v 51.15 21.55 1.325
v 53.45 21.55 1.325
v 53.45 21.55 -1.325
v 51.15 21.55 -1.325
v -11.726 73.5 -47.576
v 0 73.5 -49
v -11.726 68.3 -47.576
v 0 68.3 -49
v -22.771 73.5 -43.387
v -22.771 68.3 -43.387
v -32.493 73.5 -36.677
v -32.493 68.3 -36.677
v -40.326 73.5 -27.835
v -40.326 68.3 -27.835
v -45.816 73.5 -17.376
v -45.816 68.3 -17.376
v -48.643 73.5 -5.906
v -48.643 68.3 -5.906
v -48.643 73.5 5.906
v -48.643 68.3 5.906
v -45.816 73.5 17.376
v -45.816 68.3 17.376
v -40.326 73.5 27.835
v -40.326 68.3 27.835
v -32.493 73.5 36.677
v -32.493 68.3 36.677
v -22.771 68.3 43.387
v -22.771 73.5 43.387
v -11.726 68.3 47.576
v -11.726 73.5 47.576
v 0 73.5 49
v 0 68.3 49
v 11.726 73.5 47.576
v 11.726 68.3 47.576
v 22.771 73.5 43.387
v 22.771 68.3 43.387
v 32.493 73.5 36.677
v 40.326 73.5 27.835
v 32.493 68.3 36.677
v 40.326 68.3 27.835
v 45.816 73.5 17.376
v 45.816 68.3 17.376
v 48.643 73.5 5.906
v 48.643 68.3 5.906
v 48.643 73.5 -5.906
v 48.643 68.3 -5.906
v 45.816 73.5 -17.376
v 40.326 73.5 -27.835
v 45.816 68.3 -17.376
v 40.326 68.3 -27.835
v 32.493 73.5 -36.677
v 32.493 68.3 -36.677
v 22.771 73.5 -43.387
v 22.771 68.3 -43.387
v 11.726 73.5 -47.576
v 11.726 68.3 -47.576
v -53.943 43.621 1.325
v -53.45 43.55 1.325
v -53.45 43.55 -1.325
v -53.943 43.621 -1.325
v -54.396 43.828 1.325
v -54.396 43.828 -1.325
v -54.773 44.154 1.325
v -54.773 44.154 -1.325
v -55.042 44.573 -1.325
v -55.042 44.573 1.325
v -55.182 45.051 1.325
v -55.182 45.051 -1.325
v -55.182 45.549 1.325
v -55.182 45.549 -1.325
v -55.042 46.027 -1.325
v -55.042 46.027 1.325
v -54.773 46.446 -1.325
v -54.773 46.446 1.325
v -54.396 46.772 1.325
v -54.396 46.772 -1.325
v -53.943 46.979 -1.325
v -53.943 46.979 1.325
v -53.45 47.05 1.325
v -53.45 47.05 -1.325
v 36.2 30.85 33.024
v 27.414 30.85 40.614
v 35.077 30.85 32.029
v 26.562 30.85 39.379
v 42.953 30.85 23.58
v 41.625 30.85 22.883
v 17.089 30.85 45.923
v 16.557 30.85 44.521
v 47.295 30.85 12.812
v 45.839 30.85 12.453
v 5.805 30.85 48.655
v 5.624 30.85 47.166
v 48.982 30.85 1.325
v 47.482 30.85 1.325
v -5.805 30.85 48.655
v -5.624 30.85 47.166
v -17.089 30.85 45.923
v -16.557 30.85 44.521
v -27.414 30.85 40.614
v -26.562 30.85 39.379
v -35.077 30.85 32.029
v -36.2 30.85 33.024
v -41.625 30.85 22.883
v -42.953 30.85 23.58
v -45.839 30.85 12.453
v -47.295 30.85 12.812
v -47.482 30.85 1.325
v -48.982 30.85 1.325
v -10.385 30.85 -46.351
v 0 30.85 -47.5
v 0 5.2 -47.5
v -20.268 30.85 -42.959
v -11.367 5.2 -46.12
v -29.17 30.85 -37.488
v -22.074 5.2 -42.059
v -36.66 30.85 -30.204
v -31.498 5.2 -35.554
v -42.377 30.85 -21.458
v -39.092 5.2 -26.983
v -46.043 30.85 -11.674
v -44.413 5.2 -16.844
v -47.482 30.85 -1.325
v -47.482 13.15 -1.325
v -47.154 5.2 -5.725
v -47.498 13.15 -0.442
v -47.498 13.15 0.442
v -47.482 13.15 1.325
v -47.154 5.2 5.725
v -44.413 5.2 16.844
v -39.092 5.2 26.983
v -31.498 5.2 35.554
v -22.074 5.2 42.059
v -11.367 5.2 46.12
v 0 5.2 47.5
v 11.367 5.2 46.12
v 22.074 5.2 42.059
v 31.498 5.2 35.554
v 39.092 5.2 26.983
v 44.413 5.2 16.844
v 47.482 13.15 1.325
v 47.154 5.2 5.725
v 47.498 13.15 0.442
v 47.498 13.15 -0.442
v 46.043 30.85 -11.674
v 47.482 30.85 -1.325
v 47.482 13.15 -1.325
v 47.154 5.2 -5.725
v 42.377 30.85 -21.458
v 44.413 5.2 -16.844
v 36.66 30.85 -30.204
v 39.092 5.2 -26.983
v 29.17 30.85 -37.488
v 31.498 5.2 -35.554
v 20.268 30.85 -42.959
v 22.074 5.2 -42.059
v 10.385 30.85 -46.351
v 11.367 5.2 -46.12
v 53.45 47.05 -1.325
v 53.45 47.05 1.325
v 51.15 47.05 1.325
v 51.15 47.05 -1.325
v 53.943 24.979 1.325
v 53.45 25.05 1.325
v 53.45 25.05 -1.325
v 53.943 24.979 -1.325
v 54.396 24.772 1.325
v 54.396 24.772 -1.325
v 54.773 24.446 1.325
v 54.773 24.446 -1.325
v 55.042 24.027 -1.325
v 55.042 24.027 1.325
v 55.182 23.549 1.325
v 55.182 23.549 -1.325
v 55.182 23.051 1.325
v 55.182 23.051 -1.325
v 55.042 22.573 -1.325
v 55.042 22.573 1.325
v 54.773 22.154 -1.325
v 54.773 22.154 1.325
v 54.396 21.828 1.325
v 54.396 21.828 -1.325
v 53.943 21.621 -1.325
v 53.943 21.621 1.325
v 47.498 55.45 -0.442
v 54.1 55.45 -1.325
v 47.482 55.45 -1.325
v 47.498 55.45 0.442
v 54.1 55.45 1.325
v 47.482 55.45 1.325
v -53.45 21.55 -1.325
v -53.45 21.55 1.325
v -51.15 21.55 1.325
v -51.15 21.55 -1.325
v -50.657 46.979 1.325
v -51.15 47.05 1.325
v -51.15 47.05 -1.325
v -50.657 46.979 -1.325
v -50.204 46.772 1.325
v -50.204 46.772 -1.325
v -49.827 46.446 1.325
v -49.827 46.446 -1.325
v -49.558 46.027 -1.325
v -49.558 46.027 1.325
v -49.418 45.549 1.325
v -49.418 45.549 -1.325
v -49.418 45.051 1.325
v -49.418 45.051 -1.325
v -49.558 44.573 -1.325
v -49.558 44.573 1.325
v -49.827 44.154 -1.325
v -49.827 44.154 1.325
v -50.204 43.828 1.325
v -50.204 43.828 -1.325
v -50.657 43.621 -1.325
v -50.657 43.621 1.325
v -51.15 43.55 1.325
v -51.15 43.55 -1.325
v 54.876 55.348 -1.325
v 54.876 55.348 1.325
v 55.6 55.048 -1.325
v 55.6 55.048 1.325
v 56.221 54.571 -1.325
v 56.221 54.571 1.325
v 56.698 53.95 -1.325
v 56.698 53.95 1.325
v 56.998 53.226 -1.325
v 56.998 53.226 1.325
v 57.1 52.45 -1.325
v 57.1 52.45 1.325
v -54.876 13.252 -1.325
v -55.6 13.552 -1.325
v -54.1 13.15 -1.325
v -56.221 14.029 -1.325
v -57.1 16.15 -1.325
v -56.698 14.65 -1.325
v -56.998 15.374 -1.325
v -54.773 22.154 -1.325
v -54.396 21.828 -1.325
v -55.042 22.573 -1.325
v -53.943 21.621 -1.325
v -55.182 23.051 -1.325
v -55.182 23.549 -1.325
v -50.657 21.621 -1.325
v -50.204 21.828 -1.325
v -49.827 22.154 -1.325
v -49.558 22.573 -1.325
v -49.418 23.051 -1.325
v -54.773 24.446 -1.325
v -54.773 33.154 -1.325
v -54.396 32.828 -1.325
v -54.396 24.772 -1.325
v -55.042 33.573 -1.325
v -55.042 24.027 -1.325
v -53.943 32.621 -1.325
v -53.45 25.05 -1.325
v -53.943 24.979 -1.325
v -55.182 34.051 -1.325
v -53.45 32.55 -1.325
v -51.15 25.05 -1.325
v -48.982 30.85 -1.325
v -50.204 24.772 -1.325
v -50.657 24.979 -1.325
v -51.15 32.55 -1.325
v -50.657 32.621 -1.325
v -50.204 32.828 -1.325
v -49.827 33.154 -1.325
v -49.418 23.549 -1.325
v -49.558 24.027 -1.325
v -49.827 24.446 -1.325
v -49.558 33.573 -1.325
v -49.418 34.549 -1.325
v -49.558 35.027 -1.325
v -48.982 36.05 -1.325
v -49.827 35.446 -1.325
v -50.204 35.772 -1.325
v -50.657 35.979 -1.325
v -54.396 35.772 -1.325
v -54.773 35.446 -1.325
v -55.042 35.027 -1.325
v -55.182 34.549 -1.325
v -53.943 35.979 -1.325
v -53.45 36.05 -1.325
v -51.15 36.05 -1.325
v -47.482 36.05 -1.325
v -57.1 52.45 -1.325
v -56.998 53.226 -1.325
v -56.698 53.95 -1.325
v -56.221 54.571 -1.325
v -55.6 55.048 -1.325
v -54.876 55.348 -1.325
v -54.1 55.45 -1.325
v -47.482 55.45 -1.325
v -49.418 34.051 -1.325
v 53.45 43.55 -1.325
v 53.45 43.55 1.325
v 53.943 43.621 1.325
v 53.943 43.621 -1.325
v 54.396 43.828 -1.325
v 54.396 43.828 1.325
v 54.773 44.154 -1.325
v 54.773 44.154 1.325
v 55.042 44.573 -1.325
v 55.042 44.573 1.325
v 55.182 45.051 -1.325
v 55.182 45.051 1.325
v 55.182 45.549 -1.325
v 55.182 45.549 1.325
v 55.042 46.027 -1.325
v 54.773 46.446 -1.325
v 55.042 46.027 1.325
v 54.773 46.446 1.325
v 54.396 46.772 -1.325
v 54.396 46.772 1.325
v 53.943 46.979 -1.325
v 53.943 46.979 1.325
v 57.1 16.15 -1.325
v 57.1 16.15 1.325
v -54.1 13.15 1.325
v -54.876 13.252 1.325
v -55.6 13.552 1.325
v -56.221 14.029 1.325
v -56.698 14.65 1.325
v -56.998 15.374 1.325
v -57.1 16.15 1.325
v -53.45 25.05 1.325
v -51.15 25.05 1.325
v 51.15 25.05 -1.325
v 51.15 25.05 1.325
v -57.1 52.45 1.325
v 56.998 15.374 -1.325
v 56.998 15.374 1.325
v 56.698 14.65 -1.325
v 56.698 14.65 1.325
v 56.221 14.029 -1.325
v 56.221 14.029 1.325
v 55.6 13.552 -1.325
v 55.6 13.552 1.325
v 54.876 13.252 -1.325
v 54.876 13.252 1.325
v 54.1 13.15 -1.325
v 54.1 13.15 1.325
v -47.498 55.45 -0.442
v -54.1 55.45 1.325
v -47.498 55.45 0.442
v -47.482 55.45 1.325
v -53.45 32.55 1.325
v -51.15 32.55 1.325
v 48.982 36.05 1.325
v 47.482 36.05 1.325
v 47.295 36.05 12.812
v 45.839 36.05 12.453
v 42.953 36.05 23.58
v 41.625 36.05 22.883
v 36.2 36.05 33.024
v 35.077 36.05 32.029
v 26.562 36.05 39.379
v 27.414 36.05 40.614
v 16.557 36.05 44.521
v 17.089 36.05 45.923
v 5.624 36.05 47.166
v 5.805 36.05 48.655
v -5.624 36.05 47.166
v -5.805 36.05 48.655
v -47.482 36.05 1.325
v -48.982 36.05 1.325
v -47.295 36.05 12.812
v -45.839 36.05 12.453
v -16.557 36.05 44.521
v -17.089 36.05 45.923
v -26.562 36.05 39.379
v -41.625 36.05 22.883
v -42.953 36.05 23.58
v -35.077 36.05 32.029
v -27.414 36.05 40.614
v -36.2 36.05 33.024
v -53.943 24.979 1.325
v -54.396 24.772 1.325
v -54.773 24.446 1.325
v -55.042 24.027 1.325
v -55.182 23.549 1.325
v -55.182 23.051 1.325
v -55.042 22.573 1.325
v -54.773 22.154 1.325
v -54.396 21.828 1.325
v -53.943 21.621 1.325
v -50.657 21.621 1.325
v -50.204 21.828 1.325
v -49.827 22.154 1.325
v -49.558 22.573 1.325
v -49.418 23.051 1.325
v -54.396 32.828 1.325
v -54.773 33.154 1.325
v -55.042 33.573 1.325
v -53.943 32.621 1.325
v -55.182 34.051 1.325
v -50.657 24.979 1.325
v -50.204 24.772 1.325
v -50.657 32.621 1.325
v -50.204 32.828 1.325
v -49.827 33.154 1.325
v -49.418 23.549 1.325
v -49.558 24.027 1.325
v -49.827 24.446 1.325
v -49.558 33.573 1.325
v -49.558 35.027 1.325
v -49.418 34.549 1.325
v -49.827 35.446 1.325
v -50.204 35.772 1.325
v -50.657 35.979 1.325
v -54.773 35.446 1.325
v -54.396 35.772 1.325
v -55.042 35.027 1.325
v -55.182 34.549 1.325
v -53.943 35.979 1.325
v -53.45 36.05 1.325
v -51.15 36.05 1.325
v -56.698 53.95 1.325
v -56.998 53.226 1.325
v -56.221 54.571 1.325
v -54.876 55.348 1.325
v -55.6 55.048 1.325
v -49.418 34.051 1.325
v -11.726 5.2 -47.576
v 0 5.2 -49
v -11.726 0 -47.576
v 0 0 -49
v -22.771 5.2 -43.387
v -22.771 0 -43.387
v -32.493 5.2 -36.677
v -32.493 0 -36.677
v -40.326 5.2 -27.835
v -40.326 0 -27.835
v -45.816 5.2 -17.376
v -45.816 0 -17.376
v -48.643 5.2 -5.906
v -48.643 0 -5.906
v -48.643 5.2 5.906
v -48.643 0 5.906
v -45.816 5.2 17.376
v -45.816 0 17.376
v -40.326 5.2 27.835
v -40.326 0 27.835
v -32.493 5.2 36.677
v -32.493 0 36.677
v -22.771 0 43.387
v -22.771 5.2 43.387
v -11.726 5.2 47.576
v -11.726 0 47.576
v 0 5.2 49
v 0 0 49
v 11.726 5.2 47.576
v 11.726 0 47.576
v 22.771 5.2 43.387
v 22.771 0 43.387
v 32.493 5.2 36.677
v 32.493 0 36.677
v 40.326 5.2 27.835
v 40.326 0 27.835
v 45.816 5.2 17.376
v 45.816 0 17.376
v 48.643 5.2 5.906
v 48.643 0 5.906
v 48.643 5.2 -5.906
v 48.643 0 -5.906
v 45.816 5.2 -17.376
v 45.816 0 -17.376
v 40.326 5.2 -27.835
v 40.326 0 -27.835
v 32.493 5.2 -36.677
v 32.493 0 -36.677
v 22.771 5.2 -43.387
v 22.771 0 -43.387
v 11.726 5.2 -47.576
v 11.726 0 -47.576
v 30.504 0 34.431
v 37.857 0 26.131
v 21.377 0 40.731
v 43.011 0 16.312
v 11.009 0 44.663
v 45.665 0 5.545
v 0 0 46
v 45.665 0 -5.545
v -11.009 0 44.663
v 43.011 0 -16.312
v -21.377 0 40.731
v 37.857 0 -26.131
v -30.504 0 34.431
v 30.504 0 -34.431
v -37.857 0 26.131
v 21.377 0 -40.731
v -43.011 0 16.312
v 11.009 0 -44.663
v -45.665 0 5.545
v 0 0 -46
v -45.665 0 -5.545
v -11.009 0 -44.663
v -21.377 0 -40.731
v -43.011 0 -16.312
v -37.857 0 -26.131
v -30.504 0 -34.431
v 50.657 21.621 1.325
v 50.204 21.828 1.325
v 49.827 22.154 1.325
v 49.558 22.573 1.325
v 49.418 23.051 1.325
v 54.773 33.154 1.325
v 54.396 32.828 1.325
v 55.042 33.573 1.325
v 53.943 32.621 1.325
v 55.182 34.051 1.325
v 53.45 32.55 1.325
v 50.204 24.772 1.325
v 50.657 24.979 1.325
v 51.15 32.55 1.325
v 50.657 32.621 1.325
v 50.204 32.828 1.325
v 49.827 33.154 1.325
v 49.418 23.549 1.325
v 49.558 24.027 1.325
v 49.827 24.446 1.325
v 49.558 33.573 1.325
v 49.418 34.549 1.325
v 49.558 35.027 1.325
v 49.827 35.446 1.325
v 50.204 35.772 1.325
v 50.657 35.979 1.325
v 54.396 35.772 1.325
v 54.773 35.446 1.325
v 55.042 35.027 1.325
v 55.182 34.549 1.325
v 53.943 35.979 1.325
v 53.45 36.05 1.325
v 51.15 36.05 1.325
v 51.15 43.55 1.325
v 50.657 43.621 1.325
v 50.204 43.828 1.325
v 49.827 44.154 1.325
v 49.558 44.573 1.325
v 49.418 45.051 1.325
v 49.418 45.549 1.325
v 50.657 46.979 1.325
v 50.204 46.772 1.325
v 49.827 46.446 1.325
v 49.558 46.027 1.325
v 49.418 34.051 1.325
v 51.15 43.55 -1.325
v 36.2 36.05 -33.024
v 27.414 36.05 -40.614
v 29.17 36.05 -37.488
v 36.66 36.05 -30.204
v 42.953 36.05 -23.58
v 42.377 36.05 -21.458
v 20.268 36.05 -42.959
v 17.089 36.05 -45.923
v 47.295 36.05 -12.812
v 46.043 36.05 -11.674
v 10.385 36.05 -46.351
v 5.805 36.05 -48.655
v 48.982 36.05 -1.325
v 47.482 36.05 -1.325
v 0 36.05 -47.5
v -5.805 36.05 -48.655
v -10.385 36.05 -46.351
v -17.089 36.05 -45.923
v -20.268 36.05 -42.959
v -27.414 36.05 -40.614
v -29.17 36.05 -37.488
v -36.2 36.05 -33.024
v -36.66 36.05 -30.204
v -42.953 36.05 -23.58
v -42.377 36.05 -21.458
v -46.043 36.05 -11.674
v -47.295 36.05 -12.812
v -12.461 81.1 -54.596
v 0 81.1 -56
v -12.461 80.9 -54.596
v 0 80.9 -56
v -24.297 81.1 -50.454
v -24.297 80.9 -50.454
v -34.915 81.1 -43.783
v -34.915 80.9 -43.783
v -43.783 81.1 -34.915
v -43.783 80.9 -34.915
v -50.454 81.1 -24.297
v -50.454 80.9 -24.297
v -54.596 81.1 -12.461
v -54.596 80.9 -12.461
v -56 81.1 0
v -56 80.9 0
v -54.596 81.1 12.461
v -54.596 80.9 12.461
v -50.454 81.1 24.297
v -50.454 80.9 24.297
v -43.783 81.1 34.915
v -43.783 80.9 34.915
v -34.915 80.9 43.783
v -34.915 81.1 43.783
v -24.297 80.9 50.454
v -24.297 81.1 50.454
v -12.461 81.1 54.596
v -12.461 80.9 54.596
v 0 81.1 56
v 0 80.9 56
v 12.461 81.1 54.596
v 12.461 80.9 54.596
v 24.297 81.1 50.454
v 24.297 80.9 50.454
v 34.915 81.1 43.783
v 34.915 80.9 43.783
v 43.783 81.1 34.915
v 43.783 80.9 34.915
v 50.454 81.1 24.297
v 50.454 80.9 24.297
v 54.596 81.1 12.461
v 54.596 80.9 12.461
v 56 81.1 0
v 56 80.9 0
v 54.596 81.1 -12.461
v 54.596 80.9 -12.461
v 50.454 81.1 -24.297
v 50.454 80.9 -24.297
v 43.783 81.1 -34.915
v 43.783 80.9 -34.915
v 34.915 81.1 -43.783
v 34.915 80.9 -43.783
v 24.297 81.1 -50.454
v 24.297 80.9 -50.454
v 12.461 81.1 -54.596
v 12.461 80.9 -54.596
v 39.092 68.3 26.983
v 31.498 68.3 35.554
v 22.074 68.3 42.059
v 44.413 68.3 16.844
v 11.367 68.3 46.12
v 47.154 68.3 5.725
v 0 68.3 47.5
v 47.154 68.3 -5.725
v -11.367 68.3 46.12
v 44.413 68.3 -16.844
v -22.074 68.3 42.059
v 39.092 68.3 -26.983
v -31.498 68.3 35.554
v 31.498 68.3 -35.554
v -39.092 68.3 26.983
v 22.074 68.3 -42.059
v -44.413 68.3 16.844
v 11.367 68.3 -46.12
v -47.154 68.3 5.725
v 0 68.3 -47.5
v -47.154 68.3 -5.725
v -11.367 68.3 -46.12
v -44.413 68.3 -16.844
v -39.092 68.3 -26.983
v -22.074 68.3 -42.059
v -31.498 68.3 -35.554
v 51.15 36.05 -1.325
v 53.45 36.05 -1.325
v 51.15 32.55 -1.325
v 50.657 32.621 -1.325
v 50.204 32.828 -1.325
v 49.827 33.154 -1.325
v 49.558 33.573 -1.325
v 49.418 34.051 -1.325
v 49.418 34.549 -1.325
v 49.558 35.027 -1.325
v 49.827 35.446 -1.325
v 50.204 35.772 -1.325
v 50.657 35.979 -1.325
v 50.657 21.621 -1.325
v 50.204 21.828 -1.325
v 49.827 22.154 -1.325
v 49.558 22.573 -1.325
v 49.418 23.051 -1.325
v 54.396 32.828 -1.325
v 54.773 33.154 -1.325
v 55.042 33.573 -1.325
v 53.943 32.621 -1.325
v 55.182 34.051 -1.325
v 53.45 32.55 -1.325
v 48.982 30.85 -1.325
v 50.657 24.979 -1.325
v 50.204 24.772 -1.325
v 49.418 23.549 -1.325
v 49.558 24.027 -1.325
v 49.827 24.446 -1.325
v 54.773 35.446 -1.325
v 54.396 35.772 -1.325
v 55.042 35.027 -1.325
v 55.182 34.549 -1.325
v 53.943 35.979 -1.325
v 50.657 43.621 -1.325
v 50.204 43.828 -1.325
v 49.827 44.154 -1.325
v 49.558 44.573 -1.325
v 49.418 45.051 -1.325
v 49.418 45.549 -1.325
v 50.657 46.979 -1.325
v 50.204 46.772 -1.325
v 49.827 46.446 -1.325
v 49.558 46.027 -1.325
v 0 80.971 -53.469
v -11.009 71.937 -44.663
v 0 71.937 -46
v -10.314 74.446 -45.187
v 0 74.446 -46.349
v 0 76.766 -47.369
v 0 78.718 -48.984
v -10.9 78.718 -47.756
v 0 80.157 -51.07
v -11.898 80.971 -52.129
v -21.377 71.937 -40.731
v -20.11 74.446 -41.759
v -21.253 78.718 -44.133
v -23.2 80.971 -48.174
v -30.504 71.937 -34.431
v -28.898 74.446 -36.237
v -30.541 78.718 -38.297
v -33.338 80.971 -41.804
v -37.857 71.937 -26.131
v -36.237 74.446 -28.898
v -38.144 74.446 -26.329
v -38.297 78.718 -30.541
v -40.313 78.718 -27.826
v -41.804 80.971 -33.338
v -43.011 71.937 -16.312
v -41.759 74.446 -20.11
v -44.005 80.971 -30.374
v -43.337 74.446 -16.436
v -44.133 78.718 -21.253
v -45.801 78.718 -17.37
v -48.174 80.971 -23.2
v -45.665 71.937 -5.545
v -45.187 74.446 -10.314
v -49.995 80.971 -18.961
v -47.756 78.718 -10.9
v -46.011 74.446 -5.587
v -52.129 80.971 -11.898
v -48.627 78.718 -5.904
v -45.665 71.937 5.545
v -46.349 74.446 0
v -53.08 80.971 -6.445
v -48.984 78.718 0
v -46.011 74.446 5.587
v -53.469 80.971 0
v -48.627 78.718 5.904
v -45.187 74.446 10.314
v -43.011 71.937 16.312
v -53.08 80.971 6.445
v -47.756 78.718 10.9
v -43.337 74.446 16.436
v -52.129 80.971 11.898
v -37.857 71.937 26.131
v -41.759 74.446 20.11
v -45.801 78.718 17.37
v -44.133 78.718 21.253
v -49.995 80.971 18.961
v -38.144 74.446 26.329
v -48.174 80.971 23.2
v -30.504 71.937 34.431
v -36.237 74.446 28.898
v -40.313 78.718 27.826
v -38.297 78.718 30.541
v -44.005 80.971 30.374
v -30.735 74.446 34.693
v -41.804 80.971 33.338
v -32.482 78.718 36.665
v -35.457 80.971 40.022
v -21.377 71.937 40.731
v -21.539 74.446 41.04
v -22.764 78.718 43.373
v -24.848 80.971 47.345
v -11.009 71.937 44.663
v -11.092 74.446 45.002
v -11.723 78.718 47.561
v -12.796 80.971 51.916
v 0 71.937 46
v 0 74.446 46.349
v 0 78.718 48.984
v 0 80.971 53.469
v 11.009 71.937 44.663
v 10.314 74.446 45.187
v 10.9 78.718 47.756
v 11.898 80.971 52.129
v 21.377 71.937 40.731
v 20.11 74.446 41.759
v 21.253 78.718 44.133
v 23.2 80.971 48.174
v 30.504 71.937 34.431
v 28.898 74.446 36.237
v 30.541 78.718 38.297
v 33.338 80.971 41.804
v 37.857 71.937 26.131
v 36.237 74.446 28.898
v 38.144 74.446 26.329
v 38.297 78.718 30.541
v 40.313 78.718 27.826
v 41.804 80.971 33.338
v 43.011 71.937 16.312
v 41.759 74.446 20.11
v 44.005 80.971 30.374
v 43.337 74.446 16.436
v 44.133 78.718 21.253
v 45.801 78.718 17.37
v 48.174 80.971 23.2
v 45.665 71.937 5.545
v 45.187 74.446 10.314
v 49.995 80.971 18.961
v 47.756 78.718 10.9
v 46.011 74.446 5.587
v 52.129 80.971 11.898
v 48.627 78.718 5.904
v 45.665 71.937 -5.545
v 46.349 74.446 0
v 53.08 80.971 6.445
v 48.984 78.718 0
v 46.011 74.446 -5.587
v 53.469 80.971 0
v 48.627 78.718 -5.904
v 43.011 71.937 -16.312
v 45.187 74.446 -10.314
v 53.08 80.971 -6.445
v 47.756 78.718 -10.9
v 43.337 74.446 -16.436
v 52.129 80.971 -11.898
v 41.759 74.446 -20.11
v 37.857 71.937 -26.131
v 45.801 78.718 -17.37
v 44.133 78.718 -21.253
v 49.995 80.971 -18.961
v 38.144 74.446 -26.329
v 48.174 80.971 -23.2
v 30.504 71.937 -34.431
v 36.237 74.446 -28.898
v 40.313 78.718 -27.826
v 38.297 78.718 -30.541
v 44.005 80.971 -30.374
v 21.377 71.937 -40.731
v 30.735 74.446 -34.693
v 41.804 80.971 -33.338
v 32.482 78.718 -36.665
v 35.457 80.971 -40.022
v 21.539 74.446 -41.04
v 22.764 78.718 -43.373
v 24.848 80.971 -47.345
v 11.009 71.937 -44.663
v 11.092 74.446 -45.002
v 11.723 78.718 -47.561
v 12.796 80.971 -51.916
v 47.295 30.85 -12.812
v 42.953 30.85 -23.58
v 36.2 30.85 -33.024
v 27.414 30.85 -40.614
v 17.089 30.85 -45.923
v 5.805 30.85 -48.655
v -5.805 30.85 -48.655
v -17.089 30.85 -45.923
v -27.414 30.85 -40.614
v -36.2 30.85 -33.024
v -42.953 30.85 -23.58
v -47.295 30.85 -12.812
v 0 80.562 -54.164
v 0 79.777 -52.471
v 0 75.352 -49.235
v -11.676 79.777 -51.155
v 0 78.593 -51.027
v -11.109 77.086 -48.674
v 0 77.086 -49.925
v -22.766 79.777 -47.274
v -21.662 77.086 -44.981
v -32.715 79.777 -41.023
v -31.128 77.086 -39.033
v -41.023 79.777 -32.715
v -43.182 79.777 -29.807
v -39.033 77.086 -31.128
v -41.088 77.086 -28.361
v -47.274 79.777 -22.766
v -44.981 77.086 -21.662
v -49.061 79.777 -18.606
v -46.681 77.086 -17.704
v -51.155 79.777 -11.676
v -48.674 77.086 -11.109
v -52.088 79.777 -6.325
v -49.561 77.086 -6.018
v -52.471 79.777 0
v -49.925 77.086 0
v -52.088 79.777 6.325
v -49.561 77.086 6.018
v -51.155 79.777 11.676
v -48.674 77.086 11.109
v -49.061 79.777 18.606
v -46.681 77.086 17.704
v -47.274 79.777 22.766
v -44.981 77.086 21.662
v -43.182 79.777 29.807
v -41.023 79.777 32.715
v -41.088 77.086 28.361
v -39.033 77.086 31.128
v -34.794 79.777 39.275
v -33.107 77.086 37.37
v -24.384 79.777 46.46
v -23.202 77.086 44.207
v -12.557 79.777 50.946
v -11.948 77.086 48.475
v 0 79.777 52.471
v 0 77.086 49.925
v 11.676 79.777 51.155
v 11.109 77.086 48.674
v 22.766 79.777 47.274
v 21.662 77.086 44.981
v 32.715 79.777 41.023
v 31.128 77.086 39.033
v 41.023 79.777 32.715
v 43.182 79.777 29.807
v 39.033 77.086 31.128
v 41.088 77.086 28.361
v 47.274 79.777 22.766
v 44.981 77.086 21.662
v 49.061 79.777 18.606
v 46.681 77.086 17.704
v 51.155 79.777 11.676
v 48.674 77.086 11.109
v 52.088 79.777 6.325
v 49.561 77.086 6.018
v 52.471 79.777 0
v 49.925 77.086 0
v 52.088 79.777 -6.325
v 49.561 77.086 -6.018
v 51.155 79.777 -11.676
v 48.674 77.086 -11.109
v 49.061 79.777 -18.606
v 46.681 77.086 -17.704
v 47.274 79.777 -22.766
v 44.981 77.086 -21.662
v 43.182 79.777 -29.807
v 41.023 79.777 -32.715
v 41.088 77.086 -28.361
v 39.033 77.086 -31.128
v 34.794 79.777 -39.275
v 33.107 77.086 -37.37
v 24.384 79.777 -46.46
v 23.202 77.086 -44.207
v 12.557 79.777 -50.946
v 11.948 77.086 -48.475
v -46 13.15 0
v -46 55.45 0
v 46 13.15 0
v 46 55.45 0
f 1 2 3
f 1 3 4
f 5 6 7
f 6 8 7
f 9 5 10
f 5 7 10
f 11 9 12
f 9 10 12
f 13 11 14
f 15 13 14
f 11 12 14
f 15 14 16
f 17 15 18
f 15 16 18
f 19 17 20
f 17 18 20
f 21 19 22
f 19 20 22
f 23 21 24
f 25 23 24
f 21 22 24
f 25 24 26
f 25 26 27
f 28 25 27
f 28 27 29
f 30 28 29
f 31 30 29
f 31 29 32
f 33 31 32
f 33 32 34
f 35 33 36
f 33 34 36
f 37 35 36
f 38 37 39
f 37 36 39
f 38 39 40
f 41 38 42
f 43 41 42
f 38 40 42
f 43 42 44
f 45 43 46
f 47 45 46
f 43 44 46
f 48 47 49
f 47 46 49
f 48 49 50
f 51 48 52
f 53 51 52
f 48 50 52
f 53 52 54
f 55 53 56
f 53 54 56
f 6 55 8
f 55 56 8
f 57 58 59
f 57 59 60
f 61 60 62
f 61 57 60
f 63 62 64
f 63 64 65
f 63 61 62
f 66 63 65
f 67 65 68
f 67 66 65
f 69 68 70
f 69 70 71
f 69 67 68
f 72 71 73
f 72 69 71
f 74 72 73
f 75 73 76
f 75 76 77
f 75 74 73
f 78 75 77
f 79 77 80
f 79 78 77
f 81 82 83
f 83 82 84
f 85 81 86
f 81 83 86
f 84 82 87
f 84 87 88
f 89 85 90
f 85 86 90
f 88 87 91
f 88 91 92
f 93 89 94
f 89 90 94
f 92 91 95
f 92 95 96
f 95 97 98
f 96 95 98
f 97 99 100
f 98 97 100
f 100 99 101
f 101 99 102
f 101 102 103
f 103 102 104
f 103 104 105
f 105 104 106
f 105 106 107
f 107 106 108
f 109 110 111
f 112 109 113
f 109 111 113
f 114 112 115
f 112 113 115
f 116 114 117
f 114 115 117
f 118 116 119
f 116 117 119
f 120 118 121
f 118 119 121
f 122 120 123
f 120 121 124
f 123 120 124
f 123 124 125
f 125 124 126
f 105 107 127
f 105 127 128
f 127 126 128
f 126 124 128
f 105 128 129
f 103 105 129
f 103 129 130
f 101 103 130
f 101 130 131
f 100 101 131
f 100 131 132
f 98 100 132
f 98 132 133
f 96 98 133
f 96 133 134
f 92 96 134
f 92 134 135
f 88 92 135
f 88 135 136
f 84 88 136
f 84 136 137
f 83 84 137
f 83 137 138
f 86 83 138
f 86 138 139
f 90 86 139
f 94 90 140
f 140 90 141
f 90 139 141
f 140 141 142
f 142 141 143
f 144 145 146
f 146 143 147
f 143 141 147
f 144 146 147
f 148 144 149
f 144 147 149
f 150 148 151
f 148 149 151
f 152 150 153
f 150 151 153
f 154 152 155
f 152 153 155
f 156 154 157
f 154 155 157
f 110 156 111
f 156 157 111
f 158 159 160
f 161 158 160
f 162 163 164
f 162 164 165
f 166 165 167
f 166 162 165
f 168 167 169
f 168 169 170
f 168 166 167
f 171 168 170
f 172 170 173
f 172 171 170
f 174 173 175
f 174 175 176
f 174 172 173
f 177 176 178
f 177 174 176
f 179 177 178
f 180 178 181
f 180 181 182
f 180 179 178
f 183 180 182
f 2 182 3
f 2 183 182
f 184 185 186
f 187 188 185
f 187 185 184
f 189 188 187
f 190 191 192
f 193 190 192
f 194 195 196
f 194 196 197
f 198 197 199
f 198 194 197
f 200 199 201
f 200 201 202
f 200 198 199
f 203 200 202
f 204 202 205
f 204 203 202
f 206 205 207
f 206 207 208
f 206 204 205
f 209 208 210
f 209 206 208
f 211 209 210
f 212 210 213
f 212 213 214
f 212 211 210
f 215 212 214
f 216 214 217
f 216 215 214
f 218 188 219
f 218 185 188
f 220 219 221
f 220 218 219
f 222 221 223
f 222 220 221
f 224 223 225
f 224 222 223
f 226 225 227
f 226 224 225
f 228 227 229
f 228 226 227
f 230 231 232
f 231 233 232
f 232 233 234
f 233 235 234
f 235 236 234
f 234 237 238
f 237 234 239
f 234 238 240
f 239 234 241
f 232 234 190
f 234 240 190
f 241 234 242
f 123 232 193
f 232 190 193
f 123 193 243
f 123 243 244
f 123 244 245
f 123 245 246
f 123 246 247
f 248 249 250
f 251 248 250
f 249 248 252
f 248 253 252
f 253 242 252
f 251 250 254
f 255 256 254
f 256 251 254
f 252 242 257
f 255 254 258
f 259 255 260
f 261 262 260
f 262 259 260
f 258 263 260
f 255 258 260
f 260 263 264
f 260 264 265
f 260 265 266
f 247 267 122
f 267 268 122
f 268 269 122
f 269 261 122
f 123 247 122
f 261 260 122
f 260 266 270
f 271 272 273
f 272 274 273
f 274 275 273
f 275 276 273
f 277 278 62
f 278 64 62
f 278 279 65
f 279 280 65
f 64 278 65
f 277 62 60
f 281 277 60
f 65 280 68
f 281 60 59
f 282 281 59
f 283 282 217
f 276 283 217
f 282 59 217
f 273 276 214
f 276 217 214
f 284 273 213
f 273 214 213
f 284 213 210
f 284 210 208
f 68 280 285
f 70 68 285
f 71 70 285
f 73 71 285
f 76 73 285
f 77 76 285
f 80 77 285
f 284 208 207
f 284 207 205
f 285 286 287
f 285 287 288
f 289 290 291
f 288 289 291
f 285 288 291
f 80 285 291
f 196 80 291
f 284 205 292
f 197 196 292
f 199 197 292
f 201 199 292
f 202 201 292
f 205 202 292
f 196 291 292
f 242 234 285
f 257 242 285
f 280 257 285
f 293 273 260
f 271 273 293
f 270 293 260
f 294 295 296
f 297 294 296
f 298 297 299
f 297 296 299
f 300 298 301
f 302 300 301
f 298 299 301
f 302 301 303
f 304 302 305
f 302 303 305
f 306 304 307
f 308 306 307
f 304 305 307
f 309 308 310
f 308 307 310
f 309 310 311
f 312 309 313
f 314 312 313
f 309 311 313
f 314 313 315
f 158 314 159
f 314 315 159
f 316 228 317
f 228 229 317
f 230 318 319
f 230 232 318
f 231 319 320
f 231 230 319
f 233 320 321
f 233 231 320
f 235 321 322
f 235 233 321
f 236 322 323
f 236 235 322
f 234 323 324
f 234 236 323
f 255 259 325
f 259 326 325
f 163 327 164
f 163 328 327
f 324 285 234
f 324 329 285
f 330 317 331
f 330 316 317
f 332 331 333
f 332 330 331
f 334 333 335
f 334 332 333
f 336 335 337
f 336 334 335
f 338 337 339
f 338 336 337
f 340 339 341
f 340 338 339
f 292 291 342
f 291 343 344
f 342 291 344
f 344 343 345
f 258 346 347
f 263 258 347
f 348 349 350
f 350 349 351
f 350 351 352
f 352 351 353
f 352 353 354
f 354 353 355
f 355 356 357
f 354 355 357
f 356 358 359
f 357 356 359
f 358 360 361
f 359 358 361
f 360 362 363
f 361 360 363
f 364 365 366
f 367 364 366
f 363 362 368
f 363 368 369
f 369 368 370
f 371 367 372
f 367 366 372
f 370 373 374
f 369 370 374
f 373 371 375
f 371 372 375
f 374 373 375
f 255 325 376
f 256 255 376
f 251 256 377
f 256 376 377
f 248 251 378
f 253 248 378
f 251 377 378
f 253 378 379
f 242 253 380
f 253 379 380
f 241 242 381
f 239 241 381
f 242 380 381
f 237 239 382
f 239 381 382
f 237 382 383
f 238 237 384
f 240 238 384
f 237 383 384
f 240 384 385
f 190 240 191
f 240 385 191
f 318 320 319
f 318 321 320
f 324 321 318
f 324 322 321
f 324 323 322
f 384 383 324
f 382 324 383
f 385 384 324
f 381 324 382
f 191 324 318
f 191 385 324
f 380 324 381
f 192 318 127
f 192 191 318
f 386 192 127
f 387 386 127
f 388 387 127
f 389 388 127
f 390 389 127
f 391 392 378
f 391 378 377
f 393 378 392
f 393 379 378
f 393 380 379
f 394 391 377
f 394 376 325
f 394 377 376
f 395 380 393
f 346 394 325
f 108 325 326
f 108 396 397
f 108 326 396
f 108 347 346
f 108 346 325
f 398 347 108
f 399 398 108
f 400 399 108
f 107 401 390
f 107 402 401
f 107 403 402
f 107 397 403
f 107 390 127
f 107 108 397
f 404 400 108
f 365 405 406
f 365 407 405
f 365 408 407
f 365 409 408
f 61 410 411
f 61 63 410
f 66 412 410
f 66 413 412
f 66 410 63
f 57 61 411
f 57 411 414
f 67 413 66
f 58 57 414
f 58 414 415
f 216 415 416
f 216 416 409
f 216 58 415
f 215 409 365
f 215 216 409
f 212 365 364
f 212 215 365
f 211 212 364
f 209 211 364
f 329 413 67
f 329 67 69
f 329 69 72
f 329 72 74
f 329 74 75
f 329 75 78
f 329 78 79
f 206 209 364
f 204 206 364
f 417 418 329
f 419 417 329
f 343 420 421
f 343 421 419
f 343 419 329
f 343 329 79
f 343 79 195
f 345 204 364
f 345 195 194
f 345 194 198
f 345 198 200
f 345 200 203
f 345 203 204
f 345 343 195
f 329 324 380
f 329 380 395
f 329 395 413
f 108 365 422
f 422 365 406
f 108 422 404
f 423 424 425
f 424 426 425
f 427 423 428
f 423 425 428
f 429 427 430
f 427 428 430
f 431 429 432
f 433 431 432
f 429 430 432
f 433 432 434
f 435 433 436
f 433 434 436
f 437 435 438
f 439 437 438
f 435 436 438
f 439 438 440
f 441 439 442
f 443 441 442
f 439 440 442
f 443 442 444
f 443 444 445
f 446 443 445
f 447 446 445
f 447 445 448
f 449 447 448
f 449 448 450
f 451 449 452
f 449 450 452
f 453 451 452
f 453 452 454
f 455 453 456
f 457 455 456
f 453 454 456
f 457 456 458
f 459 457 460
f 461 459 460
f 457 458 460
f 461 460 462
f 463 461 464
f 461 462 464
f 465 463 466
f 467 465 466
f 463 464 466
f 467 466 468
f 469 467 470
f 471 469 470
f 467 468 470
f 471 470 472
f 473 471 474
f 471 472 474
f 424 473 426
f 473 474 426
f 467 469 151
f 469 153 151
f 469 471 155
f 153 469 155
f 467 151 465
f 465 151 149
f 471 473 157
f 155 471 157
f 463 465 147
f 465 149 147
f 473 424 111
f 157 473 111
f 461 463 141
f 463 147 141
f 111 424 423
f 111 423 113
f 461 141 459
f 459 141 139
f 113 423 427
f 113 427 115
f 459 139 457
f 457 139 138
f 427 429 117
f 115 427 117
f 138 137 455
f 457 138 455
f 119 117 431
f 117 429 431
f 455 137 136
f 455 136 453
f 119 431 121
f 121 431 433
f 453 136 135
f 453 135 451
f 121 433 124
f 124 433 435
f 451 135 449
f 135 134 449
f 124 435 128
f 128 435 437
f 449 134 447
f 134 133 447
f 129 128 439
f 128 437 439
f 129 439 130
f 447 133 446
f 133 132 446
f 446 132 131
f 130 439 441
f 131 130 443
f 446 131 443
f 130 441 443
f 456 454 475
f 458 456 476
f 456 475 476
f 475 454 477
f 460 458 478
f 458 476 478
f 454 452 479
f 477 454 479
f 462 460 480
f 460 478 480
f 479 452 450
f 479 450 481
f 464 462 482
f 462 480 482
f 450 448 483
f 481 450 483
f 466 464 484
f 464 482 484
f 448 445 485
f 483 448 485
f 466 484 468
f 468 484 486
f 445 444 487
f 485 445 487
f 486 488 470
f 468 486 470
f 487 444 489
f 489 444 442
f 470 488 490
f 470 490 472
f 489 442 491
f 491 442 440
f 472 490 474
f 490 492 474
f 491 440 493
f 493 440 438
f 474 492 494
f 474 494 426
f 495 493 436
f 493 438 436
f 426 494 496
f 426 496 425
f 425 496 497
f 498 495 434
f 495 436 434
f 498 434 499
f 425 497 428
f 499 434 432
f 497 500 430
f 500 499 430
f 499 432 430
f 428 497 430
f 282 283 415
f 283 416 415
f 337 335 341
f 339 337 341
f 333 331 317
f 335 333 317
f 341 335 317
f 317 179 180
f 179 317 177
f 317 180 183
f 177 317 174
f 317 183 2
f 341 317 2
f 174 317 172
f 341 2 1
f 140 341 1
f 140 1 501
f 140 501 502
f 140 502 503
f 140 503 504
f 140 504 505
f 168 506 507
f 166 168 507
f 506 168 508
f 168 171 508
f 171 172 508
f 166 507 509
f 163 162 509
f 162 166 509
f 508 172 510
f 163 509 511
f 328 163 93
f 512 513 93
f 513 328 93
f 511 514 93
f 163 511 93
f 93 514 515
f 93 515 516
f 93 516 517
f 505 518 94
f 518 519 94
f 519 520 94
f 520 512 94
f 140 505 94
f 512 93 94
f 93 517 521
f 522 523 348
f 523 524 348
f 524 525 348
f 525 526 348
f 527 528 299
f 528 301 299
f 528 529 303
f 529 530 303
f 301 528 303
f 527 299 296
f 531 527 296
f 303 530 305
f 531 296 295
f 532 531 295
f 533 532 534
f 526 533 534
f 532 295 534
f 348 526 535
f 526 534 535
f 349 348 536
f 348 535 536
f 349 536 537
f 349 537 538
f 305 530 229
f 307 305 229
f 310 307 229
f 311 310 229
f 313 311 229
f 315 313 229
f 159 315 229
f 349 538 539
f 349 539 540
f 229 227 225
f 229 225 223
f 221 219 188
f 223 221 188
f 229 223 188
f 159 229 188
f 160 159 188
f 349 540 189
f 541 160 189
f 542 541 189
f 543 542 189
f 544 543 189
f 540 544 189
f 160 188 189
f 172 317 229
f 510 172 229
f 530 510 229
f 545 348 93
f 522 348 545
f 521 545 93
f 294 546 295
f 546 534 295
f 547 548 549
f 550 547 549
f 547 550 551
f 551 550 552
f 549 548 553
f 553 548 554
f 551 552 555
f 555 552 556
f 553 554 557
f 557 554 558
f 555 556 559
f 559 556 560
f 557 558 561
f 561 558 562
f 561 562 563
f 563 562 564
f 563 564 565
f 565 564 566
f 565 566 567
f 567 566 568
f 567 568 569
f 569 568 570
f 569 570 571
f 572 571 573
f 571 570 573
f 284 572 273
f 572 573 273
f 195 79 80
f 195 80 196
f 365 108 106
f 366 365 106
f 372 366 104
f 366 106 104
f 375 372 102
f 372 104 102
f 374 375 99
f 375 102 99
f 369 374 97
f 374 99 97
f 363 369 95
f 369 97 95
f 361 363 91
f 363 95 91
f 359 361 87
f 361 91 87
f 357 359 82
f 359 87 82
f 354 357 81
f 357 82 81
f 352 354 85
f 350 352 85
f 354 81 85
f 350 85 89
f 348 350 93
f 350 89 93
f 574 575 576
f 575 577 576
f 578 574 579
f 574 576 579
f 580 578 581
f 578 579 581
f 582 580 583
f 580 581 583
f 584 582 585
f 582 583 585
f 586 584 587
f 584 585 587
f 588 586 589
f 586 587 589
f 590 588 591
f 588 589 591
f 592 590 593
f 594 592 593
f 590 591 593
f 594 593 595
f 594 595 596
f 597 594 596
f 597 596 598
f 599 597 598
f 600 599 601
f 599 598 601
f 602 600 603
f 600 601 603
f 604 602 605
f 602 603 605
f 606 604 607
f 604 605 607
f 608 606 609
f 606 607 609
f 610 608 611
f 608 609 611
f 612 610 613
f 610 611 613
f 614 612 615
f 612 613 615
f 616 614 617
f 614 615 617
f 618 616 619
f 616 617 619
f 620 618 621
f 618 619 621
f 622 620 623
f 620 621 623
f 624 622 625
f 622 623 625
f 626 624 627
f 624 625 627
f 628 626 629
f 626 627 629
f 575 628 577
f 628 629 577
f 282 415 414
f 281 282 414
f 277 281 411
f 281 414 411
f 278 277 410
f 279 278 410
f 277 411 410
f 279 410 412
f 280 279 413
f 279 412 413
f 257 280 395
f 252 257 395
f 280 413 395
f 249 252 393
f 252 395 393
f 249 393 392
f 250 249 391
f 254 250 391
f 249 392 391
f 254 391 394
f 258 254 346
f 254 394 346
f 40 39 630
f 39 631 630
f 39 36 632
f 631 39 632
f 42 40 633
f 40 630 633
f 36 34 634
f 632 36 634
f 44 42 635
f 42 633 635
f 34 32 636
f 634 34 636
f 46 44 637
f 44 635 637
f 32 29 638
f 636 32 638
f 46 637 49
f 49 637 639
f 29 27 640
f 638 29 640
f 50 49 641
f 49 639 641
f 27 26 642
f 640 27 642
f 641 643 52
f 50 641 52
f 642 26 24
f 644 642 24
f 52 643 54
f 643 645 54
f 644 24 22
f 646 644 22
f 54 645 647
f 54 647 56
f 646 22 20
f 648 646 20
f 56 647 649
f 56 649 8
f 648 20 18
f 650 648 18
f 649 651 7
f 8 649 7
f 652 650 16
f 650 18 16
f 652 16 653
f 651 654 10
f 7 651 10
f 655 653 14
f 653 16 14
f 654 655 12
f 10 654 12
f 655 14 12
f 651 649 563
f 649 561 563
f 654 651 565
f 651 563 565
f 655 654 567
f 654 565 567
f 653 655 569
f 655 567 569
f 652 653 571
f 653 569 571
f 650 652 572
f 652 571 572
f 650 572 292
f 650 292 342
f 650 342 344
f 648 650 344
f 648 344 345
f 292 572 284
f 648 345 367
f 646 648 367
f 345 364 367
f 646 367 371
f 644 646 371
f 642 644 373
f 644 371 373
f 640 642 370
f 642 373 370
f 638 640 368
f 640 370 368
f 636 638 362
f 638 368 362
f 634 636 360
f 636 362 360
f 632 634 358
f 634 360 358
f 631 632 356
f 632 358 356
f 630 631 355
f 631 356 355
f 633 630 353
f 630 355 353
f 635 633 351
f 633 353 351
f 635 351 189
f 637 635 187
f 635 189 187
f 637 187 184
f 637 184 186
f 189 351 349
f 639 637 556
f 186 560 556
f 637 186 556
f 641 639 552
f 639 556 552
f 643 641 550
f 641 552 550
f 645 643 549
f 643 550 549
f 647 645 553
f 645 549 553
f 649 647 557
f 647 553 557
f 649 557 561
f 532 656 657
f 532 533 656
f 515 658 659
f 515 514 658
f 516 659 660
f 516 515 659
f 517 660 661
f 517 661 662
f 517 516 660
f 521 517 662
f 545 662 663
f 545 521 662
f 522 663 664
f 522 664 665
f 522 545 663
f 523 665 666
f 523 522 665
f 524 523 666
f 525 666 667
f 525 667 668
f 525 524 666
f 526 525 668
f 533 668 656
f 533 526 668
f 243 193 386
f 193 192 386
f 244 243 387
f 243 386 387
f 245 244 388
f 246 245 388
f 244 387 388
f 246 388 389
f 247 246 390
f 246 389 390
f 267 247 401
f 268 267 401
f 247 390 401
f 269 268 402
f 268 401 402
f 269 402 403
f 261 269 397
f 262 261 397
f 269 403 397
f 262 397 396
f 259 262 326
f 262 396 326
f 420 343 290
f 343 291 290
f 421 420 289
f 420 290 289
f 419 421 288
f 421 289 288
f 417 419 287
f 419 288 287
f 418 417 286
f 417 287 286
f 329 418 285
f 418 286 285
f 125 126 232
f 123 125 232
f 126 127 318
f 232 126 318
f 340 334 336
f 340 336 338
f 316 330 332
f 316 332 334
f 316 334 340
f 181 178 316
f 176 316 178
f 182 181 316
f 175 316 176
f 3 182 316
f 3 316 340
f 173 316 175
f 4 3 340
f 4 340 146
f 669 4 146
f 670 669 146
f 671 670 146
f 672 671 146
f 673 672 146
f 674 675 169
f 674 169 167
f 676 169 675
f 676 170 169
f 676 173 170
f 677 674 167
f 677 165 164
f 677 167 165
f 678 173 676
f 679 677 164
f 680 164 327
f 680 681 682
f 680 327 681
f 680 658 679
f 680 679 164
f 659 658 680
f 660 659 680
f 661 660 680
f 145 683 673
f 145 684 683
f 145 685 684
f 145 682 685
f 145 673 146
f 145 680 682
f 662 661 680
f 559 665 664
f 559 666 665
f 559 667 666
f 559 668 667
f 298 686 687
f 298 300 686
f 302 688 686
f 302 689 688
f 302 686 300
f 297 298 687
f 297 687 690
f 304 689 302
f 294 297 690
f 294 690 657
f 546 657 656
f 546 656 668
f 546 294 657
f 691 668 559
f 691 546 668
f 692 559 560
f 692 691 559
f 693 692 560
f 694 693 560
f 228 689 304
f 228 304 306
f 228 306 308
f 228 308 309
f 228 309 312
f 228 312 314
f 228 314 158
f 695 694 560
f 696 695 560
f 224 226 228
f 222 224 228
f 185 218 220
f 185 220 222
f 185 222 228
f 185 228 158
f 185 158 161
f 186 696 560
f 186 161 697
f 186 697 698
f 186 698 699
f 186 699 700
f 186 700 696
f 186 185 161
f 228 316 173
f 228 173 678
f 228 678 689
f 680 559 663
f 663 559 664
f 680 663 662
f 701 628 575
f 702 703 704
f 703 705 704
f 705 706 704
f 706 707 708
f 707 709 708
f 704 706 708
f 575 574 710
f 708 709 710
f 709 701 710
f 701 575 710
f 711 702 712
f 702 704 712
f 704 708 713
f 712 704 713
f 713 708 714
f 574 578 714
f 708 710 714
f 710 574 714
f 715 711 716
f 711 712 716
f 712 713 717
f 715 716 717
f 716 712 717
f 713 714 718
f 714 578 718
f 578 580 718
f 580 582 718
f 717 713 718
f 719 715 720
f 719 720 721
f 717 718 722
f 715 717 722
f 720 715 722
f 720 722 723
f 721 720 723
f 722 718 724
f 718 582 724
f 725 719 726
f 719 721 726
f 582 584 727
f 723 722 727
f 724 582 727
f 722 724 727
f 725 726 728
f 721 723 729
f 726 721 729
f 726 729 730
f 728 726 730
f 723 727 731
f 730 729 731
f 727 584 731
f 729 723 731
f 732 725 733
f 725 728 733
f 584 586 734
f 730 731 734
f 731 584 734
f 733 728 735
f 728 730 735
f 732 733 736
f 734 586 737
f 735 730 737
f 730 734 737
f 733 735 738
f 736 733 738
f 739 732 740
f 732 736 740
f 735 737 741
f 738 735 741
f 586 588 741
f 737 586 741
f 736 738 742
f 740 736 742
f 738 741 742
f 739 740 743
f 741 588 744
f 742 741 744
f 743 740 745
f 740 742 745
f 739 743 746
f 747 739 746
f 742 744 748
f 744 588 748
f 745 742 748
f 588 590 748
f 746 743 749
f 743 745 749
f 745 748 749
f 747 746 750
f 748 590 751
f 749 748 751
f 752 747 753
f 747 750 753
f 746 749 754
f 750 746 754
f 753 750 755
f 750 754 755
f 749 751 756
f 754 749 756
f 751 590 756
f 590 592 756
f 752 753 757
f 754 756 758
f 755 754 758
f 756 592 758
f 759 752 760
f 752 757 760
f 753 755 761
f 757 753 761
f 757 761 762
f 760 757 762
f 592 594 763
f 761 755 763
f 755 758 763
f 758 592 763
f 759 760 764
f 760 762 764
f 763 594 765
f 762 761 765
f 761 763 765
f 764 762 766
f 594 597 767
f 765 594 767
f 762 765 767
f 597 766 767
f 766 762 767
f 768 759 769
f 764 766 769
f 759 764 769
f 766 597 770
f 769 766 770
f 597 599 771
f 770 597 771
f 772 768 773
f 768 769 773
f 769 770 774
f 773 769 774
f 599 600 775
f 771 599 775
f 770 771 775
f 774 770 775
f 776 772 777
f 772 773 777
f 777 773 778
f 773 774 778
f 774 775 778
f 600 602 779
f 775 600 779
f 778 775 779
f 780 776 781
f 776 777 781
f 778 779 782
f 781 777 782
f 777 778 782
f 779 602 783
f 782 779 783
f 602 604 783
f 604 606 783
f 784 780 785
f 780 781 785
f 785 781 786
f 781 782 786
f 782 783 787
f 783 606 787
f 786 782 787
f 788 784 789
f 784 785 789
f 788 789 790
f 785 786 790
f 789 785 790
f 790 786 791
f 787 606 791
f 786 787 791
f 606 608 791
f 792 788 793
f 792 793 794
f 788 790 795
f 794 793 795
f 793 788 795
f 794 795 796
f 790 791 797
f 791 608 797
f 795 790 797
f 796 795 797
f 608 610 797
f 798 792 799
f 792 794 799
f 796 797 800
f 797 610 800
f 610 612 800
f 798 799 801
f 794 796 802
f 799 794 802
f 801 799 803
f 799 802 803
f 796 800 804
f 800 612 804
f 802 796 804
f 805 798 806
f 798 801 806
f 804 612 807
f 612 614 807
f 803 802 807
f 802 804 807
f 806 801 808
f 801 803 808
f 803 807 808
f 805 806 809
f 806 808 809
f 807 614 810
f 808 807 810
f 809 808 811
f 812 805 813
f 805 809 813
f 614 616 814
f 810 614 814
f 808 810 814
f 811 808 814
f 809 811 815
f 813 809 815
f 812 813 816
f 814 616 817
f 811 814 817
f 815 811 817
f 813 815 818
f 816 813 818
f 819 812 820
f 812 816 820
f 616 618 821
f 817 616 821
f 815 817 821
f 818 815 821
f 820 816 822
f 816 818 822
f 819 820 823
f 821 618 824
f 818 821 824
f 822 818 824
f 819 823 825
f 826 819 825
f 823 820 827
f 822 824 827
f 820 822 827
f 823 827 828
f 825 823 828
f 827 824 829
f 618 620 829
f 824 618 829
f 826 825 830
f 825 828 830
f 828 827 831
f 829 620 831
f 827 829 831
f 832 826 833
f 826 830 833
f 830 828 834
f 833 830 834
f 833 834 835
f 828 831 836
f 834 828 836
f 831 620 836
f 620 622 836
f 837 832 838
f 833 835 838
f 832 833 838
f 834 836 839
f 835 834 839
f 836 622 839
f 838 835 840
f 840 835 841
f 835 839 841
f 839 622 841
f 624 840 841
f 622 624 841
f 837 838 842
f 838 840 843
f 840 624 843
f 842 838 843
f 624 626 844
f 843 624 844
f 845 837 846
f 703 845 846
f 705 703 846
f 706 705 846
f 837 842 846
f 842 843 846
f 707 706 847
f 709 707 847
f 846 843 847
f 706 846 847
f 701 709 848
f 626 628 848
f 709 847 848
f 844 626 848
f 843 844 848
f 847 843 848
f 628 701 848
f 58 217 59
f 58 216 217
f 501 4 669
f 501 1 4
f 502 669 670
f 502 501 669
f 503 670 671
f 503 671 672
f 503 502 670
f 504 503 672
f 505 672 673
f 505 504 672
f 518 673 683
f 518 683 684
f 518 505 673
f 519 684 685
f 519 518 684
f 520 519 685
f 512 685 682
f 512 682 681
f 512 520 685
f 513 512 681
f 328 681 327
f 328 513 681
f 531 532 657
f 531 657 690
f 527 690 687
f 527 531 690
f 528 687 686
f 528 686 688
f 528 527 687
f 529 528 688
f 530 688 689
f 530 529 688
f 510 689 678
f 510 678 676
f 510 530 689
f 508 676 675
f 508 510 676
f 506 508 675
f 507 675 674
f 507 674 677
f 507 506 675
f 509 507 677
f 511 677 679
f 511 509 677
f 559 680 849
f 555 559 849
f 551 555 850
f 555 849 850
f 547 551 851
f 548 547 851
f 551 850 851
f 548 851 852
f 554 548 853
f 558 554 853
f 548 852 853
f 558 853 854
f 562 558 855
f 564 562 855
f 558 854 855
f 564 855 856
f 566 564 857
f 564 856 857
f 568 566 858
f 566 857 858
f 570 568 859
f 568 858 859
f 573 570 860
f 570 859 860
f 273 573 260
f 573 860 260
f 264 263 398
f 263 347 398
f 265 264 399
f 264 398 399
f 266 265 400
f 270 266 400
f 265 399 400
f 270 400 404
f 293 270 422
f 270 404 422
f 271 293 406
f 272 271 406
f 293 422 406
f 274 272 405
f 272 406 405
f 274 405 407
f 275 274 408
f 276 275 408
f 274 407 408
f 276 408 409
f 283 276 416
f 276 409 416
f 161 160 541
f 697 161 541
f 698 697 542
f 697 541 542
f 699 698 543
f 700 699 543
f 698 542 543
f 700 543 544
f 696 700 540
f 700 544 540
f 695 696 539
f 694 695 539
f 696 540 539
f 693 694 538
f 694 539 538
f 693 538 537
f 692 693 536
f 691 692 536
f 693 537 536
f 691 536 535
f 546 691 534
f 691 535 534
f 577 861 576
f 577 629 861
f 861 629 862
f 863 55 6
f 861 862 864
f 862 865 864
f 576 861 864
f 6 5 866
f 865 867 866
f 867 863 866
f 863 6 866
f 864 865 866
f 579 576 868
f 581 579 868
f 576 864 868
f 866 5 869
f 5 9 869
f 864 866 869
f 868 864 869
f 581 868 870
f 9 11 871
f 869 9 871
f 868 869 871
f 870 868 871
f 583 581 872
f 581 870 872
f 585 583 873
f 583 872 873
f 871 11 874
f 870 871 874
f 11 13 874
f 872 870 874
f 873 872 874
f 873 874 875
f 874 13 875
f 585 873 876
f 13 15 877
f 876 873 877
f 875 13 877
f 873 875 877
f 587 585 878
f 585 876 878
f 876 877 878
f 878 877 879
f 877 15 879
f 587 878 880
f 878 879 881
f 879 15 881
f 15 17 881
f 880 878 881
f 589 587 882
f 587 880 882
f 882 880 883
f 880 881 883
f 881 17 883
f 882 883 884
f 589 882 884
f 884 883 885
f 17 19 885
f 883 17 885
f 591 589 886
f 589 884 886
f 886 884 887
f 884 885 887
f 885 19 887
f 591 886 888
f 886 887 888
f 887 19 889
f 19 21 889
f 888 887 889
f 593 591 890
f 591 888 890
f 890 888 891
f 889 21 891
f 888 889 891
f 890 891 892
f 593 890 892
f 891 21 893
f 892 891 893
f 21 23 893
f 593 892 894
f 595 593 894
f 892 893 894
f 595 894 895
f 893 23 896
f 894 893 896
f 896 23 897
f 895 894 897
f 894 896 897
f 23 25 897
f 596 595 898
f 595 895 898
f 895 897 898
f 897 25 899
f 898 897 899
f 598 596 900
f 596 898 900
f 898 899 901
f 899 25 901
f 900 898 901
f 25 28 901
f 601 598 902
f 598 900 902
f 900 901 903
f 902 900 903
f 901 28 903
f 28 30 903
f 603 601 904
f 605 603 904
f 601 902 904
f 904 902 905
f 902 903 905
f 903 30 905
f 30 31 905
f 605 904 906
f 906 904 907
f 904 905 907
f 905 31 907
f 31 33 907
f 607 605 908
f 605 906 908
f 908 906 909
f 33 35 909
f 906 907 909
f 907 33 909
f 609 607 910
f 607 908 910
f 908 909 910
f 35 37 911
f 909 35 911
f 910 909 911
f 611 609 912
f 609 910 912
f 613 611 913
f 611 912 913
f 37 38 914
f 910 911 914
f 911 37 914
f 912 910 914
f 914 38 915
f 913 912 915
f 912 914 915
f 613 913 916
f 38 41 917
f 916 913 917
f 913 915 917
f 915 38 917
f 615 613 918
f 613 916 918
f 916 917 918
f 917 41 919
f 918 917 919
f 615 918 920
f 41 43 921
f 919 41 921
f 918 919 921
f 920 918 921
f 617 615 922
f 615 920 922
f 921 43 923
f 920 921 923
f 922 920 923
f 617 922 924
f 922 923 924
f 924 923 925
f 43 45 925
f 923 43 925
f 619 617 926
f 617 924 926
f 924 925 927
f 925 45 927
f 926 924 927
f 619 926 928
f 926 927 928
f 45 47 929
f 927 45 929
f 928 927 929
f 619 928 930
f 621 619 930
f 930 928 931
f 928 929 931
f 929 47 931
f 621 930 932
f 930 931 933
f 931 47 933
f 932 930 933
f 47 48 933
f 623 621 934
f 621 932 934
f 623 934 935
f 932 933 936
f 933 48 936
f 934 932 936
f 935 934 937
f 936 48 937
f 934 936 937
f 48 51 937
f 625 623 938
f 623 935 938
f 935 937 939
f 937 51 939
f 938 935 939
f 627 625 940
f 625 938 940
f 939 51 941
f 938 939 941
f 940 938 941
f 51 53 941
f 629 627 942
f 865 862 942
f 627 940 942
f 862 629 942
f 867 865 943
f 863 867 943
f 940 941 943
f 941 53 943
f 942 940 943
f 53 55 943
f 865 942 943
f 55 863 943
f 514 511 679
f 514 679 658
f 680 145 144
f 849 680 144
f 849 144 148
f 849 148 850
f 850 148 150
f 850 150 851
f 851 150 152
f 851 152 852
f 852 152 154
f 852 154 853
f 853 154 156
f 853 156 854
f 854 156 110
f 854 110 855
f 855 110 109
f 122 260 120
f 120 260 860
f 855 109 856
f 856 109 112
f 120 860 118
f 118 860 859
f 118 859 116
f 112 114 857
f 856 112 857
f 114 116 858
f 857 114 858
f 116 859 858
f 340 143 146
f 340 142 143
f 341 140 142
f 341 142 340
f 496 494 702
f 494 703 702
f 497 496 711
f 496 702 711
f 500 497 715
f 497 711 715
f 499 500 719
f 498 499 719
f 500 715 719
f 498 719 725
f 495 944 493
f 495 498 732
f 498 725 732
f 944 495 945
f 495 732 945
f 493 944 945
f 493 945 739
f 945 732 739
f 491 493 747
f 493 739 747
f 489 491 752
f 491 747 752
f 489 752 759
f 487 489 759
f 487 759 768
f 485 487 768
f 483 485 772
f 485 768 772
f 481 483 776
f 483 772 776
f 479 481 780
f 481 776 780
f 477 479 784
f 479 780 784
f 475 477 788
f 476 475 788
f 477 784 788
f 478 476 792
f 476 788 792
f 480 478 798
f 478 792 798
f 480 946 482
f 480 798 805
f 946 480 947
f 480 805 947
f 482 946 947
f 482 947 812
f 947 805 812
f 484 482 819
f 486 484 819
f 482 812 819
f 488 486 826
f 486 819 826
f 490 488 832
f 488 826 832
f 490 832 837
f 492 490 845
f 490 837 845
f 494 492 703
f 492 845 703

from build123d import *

# Parameters (mm, degrees)
SKETCH3_W            = 11.1
SKETCH3_H            = 42.3
BOSS_EXTRUDE1_DEPTH  = 1.325
FILLET1_R            = 3
FILLET1_OF_MIRROR1_R = 3


with BuildPart() as part:
    # Sketch2 → Revolve1 (revolve)
    with BuildSketch(Plane.XY):
        with BuildLine():
            Line((46, 0), (46, 71.93668826))
            ThreePointArc((46, 71.93668826), (48.984023168, 78.718396784), (56, 81.1))
            Line((56, 81.1), (56, 80.9))
            ThreePointArc((56, 80.9), (51.02725979, 78.593132631), (49, 73.5))
            Line((49, 73.5), (49, 68.3))
            Line((49, 68.3), (47.5, 68.3))
            Line((47.5, 68.3), (47.5, 36.05))
            Line((47.5, 36.05), (49, 36.05))
            Line((49, 36.05), (49, 30.85))
            Line((49, 30.85), (47.5, 30.85))
            Line((47.5, 30.85), (47.5, 5.2))
            Line((47.5, 5.2), (49, 5.2))
            Line((49, 5.2), (49, 0))
            Line((49, 0), (46, 0))
        make_face()
    revolve(axis=Axis((0, 0, 0), (0, 1, 0)))

    # Sketch3 → Boss-Extrude1 (add, symmetric)
    with BuildSketch(Plane.XY):
        with Locations((51.55, 34.3)):
            Rectangle(SKETCH3_W, SKETCH3_H)
        with BuildLine():
            ThreePointArc((51.15, 21.55), (49.4, 23.3), (51.15, 25.05))
            Line((51.15, 25.05), (53.45, 25.05))
            ThreePointArc((53.45, 25.05), (55.2, 23.3), (53.45, 21.55))
            Line((53.45, 21.55), (51.15, 21.55))
        make_face(mode=Mode.SUBTRACT)
        with BuildLine():
            ThreePointArc((51.15, 32.55), (49.4, 34.3), (51.15, 36.05))
            Line((51.15, 36.05), (53.45, 36.05))
            ThreePointArc((53.45, 36.05), (55.2, 34.3), (53.45, 32.55))
            Line((53.45, 32.55), (51.15, 32.55))
        make_face(mode=Mode.SUBTRACT)
        with BuildLine():
            Line((53.45, 43.55), (51.15, 43.55))
            ThreePointArc((51.15, 43.55), (49.4, 45.3), (51.15, 47.05))
            Line((51.15, 47.05), (53.45, 47.05))
            ThreePointArc((53.45, 47.05), (55.2, 45.3), (53.45, 43.55))
        make_face(mode=Mode.SUBTRACT)
    boss_extrude1 = extrude(amount=BOSS_EXTRUDE1_DEPTH, both=True)

    # Fillet1
    fillet1_edges = [part.edges().sort_by_distance(p)[0] for p in [
        (57.1, 13.15, 0),
        (57.1, 55.45, 0),
    ]]
    fillet(fillet1_edges, radius=FILLET1_R)

    # Mirror1: Boss-Extrude1 across plane
    add(boss_extrude1.mirror(Plane(origin=(0, 0, 0), x_dir=(0, 0, 1), z_dir=(1, 0, 0))))

    # Fillet1 of Mirror1
    fillet1_of_mirror1_edges = [part.edges().sort_by_distance(p)[0] for p in [
        (-57.1, 13.15, 0),
        (-57.1, 55.45, 0),
    ]]
    fillet(fillet1_of_mirror1_edges, radius=FILLET1_OF_MIRROR1_R)


solid = part.part
